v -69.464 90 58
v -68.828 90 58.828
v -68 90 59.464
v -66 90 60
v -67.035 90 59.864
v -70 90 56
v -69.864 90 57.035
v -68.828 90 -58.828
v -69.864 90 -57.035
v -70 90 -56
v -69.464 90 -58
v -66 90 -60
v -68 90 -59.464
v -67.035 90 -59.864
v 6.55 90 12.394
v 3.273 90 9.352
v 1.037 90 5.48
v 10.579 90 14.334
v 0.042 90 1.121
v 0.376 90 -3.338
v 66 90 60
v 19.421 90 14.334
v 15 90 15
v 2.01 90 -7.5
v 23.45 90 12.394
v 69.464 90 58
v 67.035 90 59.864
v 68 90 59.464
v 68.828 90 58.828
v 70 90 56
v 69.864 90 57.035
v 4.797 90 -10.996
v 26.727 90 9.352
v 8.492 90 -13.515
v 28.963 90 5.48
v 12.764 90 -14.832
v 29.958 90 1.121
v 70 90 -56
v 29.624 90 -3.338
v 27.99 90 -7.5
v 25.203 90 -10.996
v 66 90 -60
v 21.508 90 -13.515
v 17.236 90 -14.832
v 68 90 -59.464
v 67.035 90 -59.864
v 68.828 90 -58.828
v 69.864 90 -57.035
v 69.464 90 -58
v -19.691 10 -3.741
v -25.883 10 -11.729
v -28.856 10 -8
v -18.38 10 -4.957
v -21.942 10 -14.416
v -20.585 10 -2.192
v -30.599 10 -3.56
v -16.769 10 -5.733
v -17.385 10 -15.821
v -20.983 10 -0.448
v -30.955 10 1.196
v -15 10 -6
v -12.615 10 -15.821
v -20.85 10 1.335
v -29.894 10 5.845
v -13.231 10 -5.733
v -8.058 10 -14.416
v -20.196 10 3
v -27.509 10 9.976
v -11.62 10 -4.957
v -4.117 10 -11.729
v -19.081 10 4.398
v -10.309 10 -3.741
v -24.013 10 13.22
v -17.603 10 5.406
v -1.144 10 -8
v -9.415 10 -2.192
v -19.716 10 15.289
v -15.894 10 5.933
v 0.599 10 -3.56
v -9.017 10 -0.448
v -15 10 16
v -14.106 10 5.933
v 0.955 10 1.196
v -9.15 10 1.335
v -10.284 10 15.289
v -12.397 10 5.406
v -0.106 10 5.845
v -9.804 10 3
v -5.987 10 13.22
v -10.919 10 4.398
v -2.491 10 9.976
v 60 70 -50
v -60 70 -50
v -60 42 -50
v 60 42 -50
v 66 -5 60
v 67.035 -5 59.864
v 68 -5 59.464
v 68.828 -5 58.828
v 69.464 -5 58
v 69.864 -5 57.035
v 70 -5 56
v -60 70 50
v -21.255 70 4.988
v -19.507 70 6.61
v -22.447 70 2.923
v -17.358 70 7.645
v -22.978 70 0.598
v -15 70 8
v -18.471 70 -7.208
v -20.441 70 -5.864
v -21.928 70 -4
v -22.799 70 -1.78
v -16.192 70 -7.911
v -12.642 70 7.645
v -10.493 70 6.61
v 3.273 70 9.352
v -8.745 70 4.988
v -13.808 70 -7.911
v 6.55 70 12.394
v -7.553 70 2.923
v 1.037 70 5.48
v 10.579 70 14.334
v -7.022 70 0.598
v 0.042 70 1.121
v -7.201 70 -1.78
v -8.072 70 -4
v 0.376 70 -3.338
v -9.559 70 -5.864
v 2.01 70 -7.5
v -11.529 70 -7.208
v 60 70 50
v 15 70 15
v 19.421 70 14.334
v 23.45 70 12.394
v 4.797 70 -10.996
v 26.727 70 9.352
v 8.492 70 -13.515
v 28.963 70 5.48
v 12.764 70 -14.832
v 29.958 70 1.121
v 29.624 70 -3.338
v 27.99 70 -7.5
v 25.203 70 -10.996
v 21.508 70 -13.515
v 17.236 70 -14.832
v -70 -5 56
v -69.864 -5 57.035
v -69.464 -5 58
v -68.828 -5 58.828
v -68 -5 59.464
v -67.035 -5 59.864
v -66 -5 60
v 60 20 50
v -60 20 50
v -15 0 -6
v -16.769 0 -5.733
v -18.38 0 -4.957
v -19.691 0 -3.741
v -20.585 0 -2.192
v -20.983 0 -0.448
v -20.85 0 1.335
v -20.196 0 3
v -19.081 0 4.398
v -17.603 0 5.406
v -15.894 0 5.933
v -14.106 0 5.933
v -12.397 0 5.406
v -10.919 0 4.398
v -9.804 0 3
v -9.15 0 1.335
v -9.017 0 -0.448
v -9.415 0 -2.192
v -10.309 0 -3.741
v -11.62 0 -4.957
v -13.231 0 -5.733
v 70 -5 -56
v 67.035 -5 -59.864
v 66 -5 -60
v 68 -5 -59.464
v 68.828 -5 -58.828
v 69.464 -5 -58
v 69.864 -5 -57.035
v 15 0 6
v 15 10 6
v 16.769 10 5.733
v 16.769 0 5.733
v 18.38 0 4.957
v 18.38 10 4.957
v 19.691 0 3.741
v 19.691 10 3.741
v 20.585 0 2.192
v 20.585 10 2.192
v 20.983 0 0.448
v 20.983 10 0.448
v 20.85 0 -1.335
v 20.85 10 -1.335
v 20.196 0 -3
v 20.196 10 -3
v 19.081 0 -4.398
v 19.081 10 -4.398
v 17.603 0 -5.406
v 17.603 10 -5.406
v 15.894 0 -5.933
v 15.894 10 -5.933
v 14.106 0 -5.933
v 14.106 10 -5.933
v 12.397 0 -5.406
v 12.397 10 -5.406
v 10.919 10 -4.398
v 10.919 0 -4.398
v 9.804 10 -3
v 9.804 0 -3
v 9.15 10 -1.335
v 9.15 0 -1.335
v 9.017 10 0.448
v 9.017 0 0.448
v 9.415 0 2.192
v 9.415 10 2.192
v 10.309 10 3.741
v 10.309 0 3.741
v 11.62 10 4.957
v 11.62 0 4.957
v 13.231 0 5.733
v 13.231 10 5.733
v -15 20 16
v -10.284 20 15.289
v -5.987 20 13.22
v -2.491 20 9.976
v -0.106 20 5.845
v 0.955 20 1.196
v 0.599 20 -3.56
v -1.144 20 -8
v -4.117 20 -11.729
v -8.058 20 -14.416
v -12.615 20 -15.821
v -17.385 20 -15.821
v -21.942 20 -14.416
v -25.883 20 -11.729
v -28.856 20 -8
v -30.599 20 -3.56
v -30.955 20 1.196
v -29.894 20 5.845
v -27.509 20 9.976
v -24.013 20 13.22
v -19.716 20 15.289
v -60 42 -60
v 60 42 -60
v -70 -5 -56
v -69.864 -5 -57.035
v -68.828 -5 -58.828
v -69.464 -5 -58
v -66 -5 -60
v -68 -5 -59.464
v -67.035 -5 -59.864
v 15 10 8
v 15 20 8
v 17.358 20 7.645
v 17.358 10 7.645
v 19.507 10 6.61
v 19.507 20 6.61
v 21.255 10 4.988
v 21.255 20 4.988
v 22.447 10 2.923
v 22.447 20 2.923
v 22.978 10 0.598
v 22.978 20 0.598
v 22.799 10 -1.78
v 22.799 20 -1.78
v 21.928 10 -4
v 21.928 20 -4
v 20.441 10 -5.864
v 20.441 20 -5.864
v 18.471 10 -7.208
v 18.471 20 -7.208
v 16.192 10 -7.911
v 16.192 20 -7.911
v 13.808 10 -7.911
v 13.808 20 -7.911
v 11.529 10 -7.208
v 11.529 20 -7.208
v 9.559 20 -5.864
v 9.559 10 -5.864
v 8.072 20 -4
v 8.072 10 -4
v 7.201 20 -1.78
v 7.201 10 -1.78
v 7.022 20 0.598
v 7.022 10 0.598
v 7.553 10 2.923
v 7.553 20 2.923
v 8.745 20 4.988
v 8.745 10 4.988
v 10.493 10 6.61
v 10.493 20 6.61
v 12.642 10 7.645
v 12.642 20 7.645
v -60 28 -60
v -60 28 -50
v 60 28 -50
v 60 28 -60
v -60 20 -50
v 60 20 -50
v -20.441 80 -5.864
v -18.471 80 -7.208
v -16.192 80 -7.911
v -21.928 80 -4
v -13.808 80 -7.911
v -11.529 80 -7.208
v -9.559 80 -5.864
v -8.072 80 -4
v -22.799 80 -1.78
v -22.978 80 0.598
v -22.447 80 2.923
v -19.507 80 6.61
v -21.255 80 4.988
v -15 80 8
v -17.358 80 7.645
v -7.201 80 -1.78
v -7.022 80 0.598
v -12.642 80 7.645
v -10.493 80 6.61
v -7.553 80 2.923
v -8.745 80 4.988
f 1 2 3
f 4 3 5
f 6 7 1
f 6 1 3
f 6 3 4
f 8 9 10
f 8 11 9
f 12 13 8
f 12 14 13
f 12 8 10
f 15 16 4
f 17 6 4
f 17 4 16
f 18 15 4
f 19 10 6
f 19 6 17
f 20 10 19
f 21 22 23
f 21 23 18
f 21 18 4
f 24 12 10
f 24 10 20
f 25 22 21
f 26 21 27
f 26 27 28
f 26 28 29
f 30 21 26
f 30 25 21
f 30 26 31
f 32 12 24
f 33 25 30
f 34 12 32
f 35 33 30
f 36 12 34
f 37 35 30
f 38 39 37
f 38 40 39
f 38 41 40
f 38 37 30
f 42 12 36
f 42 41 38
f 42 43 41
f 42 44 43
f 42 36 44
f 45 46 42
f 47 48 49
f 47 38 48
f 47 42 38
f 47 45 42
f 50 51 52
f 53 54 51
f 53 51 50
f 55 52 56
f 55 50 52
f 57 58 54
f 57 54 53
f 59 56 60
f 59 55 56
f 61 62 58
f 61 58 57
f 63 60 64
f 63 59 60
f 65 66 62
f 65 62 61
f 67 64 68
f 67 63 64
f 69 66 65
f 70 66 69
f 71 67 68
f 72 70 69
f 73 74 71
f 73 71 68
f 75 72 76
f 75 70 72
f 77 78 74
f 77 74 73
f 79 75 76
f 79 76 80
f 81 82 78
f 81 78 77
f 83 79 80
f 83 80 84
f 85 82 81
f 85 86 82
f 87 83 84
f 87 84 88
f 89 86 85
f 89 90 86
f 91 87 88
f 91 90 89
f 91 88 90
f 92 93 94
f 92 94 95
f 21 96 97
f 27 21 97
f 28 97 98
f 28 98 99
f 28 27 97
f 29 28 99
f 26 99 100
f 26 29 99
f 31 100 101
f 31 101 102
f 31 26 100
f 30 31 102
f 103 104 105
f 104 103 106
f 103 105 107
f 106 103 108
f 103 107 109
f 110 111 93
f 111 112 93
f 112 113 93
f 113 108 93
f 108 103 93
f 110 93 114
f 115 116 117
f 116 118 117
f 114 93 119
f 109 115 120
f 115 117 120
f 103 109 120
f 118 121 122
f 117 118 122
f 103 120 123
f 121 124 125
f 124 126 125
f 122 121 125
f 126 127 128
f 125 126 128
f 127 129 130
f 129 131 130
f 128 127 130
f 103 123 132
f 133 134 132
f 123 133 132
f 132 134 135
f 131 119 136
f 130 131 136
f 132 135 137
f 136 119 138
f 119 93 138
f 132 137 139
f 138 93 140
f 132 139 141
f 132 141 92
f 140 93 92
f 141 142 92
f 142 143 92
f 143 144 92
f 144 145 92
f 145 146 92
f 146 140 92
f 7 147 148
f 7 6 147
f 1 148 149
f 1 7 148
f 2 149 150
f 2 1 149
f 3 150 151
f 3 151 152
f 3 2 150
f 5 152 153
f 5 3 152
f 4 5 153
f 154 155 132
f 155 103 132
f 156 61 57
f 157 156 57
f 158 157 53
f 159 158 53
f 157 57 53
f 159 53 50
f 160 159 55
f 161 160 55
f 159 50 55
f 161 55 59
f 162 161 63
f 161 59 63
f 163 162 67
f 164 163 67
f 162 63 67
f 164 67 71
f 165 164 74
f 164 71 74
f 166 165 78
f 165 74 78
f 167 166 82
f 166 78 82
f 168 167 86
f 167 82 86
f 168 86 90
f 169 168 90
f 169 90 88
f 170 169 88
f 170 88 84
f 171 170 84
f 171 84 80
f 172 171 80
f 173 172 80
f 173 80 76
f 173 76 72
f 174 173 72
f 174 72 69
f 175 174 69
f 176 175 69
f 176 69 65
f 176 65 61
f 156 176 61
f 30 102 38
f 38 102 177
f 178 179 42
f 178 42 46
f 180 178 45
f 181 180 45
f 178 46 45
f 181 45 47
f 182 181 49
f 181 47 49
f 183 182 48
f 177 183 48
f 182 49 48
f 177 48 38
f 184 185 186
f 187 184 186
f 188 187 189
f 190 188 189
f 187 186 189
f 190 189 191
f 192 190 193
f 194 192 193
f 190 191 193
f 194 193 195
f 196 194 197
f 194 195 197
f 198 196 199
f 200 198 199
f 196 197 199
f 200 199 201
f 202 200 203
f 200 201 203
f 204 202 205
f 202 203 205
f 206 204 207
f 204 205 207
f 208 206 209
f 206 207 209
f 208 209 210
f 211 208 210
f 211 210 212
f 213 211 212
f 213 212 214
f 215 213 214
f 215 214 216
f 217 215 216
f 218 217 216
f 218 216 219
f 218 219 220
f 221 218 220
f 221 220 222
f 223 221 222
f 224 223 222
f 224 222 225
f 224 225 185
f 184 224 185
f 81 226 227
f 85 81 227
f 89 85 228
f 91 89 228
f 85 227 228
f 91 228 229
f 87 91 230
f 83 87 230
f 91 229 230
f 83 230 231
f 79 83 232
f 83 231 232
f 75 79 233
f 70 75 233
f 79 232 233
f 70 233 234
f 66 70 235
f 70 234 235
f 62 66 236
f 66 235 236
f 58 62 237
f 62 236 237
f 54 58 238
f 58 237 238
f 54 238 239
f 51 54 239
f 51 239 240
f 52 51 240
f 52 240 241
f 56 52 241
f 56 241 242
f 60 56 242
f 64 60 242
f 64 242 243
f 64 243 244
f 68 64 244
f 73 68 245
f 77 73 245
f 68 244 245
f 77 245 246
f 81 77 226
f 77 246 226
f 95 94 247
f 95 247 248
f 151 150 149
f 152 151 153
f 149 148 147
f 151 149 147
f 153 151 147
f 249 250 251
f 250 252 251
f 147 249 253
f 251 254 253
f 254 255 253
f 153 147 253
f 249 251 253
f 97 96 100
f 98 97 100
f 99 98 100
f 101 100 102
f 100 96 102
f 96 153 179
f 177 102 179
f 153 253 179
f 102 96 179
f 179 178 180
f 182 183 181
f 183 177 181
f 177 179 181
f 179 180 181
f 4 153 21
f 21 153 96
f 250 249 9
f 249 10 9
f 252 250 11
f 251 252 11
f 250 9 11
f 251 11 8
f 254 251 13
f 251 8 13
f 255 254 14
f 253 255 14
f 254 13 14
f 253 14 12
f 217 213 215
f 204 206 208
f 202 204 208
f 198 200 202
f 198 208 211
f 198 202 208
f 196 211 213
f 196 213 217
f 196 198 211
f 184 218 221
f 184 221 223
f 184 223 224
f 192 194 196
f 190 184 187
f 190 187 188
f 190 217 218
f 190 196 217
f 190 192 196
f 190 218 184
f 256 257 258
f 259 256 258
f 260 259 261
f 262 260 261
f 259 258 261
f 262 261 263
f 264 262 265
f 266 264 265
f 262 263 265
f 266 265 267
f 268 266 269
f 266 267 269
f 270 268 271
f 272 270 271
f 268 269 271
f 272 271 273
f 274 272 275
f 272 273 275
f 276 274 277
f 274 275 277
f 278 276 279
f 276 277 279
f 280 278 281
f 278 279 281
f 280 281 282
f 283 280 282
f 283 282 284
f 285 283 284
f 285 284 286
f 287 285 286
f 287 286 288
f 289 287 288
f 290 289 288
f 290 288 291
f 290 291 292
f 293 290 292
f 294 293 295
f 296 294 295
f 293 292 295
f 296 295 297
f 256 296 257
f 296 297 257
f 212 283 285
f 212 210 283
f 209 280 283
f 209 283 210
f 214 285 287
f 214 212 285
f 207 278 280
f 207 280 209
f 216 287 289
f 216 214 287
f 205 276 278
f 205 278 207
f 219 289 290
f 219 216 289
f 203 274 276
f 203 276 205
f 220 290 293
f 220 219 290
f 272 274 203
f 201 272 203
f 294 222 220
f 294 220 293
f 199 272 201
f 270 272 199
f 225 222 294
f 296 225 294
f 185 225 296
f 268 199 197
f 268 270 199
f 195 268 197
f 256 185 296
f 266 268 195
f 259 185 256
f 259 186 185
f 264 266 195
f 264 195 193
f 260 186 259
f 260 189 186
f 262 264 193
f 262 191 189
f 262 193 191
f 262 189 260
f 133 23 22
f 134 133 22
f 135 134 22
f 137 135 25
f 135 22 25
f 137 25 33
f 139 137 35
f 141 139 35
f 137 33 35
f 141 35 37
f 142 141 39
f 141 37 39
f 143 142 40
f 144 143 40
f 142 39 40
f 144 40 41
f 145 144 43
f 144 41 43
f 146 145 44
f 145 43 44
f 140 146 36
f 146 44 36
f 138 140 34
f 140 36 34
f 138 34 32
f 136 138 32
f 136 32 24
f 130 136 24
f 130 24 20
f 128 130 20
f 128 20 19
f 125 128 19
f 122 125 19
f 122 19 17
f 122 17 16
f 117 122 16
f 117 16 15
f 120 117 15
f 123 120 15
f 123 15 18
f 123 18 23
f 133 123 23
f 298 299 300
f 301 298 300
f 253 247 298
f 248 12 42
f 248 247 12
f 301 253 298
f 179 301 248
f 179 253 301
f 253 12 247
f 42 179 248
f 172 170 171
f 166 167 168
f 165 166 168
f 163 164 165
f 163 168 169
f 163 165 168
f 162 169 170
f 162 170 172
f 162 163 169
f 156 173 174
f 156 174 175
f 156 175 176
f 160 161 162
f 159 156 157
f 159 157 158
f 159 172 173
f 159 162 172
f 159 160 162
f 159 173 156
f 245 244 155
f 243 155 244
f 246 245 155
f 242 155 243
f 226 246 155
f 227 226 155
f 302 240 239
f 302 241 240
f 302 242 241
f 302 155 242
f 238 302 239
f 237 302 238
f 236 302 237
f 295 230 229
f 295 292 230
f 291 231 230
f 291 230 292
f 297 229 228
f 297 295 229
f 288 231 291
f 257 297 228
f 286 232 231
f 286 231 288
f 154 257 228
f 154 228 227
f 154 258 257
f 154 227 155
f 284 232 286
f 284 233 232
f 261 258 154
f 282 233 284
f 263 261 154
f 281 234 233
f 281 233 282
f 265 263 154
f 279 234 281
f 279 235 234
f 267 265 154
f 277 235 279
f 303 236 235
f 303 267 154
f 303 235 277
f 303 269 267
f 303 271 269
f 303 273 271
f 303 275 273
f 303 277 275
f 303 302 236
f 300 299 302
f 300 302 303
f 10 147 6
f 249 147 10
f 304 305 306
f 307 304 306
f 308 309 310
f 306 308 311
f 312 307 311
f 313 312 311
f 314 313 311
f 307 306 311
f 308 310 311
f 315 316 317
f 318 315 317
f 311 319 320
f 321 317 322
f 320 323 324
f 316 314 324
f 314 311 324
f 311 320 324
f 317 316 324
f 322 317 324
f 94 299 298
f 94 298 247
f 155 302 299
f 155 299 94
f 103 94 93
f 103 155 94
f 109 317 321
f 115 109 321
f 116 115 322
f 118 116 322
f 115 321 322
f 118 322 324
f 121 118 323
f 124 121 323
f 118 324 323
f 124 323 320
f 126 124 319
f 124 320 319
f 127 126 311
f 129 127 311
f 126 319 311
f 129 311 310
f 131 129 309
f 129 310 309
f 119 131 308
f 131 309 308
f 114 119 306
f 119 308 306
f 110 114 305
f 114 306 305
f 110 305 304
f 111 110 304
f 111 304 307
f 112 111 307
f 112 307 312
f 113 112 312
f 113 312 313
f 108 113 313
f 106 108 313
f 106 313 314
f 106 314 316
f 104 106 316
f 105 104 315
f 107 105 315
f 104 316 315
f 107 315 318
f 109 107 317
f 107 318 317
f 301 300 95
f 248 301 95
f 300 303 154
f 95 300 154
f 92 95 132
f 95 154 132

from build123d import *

# Parameters (mm, degrees)
BOX_EXTRUDE_DEPTH             = 90
BOX_EXTRUDE_DEPTH_BACK        = 5
SKETCH2_W                     = 140
SKETCH2_H                     = 120
BOX_INNER_CUT_START           = -20
SKETCH3_W                     = 120
SKETCH3_H                     = 100
BOX_INNER_CUT_DEPTH           = 50
SHAFT_CUT_START               = -70
SKETCH6_R                     = 6
SHAFT_CUT_DEPTH               = 20
BEARING_CUTS_INSIDE_BOX_START = -70
SKETCH9_R                     = 8
SKETCH9_R_2                   = 16
BEARING_CUTS_INSIDE_BOX_DEPTH = 10
SCISSOR_CUT_START             = -10
SKETCH11_W                    = 120
SKETCH11_H                    = 14
SCISSOR_CUT_DEPTH             = 156.529453572
LEFT_BEARING_LID_CUT_START    = -10
SKETCH18_R                    = 8
LEFT_BEARING_LID_CUT_DEPTH    = 10
RIGHT_BEARING_LID_CUT_REACH   = 134.382
SKETCH12_R                    = 15
OUTER_EDGES_FILLET_R          = 4


with BuildPart() as part:
    # Sketch2 → BOX_EXTRUDE (new, two sides: drawn at the far end of the back side and taken through both)
    with BuildSketch(Plane(origin=(0, 0, 0), x_dir=(1, 0, 0), z_dir=(0, 1, 0)).offset(-BOX_EXTRUDE_DEPTH_BACK)):
        Rectangle(SKETCH2_W, SKETCH2_H)
    extrude(amount=BOX_EXTRUDE_DEPTH + BOX_EXTRUDE_DEPTH_BACK)

    # Sketch3 → BOX_INNER_CUT (cut)
    with BuildSketch(Plane(origin=(0, 90, 0), x_dir=(1, 0, 0), z_dir=(0, 1, 0)).offset(BOX_INNER_CUT_START)):
        Rectangle(SKETCH3_W, SKETCH3_H)
    extrude(amount=-BOX_INNER_CUT_DEPTH, mode=Mode.SUBTRACT)

    # Sketch6 → SHAFT_CUT (cut)
    with BuildSketch(Plane(origin=(0, 90, 0), x_dir=(1, 0, 0), z_dir=(0, 1, 0)).offset(SHAFT_CUT_START)):
        with Locations(Location((15, 0, 0), (0, 0, 270))):
            Circle(SKETCH6_R)
        with Locations(Location((-15, 0, 0), (0, 0, 90))):
            Circle(SKETCH6_R)
    extrude(amount=-SHAFT_CUT_DEPTH, mode=Mode.SUBTRACT)

    # Sketch9 → BEARING_CUTS_INSIDE_BOX (cut)
    with BuildSketch(Plane(origin=(0, 90, 0), x_dir=(1, 0, 0), z_dir=(0, 1, 0)).offset(BEARING_CUTS_INSIDE_BOX_START)):
        with Locations(Location((15, 0, 0), (0, 0, 270))):
            Circle(SKETCH9_R)
        with Locations(Location((-15, 0, 0), (0, 0, 270))):
            Circle(SKETCH9_R_2)
    extrude(amount=-BEARING_CUTS_INSIDE_BOX_DEPTH, mode=Mode.SUBTRACT)

    # Sketch11 → SCISSOR_CUT (cut, through all)
    with BuildSketch(Plane.XY.offset(60).offset(SCISSOR_CUT_START)):
        with Locations((0, 35)):
            Rectangle(SKETCH11_W, SKETCH11_H)
    extrude(amount=-SCISSOR_CUT_DEPTH, mode=Mode.SUBTRACT)

    # Sketch18 → LEFT_BEARING_LID_CUT (cut)
    with BuildSketch(Plane(origin=(0, 90, 0), x_dir=(1, 0, 0), z_dir=(0, 1, 0)).offset(LEFT_BEARING_LID_CUT_START)):
        with Locations(Location((-15, 0, 0), (0, 0, 270))):
            Circle(SKETCH18_R)
    extrude(amount=-LEFT_BEARING_LID_CUT_DEPTH, mode=Mode.SUBTRACT)

    # Sketch12 → RIGHT_BEARING_LID_CUT (cut, up to next)
    with BuildSketch(Plane(origin=(0, 90, 0), x_dir=(1, 0, 0), z_dir=(0, 1, 0)), mode=Mode.PRIVATE) as right_bearing_lid_cut_sk1:
        with Locations(Location((15, 0, 0), (0, 0, 270))):
            Circle(SKETCH12_R)
    right_bearing_lid_cut_tool1 = extrude(right_bearing_lid_cut_sk1.sketch, amount=-RIGHT_BEARING_LID_CUT_REACH, mode=Mode.PRIVATE) & part.part
    add(right_bearing_lid_cut_tool1.solids().sort_by_distance((15, 90, 0))[0], mode=Mode.SUBTRACT)

    # OUTER_EDGES_FILLET
    outer_edges_fillet_edges = [part.edges().sort_by_distance(p)[0] for p in [
        (-70, 42.5, -60),
        (70, 42.5, -60),
        (70, 42.5, 60),
        (-70, 42.5, 60),
    ]]
    fillet(outer_edges_fillet_edges, radius=OUTER_EDGES_FILLET_R)


solid = part.part
